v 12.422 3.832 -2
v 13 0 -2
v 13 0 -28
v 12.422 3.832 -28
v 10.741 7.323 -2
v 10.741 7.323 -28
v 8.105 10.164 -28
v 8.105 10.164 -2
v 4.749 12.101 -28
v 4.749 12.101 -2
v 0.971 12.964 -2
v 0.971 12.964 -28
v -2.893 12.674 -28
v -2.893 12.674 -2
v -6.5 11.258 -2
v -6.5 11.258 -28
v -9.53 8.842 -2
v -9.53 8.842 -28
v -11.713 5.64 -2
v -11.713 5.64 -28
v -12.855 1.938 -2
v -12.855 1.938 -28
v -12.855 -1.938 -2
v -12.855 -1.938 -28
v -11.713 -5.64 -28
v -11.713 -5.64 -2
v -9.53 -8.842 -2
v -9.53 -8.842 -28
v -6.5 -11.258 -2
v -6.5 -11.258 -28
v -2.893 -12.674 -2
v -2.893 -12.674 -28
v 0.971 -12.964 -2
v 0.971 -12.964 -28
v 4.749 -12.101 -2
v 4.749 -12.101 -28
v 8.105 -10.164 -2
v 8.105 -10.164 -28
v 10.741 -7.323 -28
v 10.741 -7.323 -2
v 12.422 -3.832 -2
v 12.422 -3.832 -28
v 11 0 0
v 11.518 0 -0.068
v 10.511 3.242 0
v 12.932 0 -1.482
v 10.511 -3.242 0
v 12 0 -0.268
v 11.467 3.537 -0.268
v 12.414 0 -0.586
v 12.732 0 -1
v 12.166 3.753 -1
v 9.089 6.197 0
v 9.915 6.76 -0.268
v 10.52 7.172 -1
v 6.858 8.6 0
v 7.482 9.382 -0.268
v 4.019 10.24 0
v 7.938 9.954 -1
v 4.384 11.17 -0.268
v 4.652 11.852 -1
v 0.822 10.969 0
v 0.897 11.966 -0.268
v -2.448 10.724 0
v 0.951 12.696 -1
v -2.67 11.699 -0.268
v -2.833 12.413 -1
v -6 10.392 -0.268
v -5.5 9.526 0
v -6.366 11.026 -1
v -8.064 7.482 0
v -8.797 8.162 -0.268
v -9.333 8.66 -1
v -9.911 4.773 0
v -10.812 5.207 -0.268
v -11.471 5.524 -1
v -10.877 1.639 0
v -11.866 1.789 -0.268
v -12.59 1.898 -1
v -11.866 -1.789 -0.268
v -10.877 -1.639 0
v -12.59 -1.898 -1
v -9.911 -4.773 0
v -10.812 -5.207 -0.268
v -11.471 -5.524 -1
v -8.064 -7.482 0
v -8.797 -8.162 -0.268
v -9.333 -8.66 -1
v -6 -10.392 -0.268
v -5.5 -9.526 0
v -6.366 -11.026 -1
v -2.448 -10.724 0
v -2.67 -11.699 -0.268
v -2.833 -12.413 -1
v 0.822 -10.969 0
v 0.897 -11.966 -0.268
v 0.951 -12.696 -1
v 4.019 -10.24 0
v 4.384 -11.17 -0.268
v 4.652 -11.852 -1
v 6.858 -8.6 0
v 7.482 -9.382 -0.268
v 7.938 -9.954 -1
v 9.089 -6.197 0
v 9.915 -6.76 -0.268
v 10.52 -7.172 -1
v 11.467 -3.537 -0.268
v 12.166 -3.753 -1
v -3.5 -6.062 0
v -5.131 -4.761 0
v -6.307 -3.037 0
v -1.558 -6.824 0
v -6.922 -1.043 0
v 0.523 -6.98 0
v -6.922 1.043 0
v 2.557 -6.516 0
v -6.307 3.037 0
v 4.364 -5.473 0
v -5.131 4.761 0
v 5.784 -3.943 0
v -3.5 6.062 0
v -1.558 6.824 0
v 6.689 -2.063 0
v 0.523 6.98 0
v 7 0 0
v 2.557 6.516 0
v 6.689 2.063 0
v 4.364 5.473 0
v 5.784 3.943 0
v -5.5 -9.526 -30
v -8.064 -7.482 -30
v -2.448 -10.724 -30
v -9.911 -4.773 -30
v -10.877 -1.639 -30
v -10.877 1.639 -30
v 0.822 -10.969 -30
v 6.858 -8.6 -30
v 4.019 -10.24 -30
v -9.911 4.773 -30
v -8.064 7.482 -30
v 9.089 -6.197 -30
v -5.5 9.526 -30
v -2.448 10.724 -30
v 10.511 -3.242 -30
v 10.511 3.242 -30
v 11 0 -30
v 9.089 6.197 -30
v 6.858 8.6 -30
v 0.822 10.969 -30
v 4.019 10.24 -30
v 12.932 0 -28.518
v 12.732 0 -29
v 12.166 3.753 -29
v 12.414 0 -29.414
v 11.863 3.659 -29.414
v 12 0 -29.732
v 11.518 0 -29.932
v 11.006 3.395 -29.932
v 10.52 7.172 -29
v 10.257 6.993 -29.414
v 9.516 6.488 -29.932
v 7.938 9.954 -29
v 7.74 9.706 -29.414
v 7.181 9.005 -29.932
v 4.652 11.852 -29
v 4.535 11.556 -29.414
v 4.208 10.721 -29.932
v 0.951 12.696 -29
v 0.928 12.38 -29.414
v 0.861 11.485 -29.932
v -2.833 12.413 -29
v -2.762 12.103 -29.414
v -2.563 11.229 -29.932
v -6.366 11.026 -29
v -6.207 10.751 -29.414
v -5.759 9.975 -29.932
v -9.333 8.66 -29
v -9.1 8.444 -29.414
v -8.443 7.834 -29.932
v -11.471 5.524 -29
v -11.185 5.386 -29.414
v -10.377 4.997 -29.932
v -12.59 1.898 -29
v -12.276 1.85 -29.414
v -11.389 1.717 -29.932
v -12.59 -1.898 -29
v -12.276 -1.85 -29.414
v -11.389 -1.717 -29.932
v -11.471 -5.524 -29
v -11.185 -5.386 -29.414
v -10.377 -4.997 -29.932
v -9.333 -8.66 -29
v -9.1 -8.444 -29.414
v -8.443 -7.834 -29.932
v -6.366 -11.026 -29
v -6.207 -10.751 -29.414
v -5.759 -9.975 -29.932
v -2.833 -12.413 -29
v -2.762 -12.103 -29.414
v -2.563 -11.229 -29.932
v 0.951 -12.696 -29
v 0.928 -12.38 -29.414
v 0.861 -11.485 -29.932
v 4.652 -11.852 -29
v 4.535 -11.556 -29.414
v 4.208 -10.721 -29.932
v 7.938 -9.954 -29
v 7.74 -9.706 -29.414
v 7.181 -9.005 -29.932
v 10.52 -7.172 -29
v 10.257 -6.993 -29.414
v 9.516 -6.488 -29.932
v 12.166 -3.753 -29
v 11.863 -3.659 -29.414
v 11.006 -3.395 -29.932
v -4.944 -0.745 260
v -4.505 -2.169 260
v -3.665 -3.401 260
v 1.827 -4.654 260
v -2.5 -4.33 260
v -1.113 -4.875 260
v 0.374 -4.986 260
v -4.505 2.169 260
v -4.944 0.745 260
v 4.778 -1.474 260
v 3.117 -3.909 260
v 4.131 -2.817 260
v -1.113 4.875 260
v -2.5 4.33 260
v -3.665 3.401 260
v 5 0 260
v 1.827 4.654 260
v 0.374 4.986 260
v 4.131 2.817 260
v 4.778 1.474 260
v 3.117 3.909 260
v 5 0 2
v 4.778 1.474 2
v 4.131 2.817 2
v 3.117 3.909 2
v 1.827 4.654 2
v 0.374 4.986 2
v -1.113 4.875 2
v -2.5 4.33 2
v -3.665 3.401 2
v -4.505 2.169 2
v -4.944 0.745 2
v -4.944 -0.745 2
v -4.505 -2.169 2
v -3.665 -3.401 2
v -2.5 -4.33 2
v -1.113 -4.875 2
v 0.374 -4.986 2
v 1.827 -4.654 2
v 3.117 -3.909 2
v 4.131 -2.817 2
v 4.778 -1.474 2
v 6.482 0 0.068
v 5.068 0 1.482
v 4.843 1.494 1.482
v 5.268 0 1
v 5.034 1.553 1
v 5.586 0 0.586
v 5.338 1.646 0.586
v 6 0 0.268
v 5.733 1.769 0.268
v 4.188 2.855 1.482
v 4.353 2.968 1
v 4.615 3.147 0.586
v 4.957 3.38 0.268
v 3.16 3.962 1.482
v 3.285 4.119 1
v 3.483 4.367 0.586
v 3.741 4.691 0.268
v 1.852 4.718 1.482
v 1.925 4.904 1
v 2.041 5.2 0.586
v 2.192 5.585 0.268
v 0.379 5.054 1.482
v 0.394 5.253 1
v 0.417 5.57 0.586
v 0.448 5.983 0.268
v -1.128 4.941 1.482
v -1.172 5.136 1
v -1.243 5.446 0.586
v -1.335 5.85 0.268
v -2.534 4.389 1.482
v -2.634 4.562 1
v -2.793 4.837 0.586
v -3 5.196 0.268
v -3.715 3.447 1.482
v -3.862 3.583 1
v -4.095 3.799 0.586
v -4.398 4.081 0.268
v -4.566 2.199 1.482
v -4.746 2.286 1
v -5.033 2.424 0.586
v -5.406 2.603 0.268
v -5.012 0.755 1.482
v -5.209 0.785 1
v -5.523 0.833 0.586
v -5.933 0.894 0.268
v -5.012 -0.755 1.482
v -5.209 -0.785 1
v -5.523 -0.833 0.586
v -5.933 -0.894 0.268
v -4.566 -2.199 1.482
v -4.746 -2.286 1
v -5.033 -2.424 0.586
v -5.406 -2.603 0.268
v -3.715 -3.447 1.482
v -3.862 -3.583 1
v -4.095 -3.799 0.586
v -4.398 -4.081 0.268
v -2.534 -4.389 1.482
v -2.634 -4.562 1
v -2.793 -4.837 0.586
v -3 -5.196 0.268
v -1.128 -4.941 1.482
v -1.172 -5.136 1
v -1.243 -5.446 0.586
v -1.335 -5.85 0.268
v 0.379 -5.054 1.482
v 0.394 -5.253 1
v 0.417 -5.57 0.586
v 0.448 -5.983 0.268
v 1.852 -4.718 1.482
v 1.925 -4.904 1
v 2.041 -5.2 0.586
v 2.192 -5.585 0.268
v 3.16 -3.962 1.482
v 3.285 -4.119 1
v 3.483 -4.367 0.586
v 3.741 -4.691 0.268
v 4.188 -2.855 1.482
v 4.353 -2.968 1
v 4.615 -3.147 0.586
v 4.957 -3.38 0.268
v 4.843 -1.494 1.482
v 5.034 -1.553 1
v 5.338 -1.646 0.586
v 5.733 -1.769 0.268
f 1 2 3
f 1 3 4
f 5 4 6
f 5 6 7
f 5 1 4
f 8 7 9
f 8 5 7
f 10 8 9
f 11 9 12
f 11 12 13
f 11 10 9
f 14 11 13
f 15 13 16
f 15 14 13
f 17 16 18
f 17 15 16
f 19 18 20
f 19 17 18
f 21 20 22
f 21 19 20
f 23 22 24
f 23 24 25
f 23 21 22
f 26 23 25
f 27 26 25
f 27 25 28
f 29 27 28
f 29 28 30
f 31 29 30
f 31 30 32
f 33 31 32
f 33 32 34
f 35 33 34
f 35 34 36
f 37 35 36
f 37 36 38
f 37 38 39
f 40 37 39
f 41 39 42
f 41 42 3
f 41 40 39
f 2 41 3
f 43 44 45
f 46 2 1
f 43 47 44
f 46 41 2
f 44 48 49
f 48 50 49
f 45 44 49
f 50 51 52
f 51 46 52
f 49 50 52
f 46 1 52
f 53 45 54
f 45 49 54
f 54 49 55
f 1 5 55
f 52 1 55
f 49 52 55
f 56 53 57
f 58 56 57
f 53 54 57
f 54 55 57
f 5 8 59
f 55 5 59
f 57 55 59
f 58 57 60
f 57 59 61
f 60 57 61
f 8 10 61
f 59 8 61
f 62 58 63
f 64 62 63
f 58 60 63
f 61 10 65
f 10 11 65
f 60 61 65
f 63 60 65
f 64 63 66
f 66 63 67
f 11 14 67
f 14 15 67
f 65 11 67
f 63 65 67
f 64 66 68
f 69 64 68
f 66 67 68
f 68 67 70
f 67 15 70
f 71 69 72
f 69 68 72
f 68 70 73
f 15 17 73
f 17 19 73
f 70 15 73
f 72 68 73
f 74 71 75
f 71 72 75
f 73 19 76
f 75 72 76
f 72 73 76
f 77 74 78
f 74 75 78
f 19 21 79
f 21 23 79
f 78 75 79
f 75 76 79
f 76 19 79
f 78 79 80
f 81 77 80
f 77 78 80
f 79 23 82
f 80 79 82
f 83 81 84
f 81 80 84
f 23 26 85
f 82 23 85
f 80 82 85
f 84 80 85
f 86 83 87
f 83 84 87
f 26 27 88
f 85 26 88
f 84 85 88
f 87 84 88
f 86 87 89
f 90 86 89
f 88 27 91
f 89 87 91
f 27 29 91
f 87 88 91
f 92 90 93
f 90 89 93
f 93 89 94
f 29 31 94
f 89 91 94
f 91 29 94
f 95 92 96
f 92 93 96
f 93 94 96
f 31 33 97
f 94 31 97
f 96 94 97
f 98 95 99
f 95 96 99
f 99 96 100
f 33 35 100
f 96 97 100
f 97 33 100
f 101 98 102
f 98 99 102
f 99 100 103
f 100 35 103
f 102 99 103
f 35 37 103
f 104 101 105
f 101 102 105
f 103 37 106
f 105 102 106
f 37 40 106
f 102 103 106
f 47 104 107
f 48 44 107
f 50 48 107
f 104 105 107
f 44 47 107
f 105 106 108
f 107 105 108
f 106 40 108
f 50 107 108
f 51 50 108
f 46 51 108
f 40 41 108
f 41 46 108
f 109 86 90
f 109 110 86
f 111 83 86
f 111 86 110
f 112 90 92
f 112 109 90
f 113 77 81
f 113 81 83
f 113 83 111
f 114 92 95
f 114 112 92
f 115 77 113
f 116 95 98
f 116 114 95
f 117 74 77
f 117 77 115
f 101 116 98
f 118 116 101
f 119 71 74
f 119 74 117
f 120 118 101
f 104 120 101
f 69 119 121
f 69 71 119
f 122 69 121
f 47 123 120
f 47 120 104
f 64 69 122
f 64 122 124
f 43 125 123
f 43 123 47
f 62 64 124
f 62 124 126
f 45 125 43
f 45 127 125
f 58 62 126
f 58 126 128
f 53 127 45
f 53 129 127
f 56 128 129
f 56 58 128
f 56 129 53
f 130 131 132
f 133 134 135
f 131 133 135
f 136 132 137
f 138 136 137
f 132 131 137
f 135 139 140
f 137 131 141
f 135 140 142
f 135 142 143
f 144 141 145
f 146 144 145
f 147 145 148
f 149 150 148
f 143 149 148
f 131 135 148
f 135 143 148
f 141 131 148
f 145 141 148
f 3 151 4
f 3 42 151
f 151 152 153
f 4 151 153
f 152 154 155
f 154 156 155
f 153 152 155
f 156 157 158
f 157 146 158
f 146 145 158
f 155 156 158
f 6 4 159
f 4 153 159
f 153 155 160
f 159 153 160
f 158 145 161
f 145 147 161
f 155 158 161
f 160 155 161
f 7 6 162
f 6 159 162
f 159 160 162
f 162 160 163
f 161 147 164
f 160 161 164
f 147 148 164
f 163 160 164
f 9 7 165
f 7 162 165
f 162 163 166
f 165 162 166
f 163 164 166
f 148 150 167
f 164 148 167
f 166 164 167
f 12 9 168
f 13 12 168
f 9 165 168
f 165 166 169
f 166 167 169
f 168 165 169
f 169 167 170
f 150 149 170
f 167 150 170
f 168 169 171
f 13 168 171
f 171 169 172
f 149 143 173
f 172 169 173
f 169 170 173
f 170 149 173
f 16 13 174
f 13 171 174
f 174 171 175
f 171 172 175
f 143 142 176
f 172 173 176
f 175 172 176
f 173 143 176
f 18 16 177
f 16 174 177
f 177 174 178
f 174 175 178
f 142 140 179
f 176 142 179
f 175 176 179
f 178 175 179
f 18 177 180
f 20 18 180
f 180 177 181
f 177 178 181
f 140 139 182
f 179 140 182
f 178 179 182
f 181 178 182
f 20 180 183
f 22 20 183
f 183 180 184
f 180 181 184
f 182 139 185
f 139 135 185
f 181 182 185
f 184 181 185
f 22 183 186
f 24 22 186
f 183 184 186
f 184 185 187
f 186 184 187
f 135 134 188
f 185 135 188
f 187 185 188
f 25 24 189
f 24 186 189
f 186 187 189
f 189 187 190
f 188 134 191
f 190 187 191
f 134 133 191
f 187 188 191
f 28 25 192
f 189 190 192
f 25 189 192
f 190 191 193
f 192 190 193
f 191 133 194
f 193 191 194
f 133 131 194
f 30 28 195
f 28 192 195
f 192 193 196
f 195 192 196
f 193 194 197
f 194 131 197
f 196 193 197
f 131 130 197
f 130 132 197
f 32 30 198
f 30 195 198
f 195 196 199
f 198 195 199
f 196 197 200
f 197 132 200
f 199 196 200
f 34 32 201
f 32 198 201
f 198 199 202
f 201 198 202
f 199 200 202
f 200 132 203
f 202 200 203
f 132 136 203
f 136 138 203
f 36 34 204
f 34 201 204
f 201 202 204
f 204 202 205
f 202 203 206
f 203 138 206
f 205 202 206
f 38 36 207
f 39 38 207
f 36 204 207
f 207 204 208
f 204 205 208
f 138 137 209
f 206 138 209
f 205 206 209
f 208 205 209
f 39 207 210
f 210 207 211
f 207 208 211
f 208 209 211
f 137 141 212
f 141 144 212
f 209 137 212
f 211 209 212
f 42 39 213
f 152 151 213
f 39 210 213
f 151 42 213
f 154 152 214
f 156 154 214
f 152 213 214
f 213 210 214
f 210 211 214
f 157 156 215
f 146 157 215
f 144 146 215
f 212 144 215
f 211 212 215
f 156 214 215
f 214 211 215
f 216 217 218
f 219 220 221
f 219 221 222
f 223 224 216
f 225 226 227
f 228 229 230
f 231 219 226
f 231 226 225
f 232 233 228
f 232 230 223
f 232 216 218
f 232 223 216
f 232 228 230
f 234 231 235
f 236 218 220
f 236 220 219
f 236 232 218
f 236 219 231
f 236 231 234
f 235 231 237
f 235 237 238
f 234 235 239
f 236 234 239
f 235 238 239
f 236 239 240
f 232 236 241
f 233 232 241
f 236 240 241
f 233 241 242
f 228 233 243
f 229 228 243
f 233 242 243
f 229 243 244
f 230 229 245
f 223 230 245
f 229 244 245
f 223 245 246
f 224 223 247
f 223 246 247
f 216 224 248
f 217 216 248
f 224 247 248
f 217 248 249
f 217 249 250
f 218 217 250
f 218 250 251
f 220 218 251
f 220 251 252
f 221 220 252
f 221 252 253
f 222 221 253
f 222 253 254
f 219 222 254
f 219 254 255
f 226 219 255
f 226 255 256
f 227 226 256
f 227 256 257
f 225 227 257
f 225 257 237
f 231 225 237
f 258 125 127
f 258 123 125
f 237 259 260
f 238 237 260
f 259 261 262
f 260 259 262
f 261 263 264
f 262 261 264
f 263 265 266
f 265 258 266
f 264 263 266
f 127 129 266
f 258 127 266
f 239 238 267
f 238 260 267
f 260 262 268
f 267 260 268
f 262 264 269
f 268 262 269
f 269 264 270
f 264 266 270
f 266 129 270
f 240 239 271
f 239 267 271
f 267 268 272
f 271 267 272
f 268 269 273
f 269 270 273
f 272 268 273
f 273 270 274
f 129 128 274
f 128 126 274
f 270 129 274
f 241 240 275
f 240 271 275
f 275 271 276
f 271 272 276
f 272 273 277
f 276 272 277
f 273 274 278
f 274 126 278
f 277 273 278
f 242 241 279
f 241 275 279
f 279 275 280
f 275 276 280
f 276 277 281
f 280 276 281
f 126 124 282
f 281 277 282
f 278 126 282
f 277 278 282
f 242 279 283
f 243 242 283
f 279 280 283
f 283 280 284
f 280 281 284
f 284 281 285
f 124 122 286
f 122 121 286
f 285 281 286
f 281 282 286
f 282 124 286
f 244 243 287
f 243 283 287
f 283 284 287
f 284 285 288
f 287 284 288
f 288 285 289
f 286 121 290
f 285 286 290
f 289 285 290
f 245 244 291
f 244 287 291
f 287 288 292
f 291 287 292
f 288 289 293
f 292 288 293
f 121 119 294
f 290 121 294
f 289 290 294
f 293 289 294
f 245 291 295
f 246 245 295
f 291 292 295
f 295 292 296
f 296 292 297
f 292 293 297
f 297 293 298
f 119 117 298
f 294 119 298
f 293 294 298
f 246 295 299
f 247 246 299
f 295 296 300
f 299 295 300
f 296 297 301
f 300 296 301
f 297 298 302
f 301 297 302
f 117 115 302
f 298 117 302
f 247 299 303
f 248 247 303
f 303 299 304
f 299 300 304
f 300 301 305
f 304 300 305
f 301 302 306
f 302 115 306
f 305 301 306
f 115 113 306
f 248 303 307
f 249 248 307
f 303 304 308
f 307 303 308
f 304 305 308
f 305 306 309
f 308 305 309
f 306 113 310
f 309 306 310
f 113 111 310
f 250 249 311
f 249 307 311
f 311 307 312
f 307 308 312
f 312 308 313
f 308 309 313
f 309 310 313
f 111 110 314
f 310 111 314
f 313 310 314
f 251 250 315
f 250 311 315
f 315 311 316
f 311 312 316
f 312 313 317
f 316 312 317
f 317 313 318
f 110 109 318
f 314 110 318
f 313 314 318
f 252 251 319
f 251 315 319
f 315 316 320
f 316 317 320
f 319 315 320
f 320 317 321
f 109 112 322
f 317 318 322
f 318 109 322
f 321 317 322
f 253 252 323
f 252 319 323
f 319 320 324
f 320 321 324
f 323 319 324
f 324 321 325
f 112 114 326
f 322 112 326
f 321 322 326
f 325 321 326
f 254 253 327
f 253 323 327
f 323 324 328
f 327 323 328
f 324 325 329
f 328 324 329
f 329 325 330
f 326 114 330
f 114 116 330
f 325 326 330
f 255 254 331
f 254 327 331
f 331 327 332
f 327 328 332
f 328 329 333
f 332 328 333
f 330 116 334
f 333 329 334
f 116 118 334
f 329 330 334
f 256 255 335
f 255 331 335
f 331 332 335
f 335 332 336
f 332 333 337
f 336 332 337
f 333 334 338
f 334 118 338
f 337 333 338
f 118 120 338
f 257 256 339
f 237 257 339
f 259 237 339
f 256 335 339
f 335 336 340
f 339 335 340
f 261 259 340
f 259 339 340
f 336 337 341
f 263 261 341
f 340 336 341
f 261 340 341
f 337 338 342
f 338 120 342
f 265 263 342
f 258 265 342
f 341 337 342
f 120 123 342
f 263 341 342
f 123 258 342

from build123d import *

# Parameters (mm, degrees)
SKETCH1_R           = 13
BOSS_EXTRUDE1_DEPTH = 30
SKETCH2_R           = 5
BOSS_EXTRUDE2_DEPTH = 240
SKETCH3_R           = 5
BOSS_EXTRUDE3_DEPTH = 20
FILLET1_R           = 2


with BuildPart() as part:
    # Sketch1 → Boss-Extrude1 (new body)
    with BuildSketch(Plane.XY):
        Circle(SKETCH1_R)
    extrude(amount=-BOSS_EXTRUDE1_DEPTH)

    # Sketch2 → Boss-Extrude2 (add)
    with BuildSketch(Plane.XY):
        Circle(SKETCH2_R)
    extrude(amount=BOSS_EXTRUDE2_DEPTH)

    # Sketch3 → Boss-Extrude3 (add)
    with BuildSketch(Plane.XY.offset(240)):
        Circle(SKETCH3_R)
    extrude(amount=BOSS_EXTRUDE3_DEPTH)

    # Fillet1
    fillet1_edges = [part.edges().sort_by_distance(p)[0] for p in [
        (-13, 0, 0),
        (-13, 0, -30),
        (-5, 0, 0),
    ]]
    fillet(fillet1_edges, radius=FILLET1_R)


solid = part.part
